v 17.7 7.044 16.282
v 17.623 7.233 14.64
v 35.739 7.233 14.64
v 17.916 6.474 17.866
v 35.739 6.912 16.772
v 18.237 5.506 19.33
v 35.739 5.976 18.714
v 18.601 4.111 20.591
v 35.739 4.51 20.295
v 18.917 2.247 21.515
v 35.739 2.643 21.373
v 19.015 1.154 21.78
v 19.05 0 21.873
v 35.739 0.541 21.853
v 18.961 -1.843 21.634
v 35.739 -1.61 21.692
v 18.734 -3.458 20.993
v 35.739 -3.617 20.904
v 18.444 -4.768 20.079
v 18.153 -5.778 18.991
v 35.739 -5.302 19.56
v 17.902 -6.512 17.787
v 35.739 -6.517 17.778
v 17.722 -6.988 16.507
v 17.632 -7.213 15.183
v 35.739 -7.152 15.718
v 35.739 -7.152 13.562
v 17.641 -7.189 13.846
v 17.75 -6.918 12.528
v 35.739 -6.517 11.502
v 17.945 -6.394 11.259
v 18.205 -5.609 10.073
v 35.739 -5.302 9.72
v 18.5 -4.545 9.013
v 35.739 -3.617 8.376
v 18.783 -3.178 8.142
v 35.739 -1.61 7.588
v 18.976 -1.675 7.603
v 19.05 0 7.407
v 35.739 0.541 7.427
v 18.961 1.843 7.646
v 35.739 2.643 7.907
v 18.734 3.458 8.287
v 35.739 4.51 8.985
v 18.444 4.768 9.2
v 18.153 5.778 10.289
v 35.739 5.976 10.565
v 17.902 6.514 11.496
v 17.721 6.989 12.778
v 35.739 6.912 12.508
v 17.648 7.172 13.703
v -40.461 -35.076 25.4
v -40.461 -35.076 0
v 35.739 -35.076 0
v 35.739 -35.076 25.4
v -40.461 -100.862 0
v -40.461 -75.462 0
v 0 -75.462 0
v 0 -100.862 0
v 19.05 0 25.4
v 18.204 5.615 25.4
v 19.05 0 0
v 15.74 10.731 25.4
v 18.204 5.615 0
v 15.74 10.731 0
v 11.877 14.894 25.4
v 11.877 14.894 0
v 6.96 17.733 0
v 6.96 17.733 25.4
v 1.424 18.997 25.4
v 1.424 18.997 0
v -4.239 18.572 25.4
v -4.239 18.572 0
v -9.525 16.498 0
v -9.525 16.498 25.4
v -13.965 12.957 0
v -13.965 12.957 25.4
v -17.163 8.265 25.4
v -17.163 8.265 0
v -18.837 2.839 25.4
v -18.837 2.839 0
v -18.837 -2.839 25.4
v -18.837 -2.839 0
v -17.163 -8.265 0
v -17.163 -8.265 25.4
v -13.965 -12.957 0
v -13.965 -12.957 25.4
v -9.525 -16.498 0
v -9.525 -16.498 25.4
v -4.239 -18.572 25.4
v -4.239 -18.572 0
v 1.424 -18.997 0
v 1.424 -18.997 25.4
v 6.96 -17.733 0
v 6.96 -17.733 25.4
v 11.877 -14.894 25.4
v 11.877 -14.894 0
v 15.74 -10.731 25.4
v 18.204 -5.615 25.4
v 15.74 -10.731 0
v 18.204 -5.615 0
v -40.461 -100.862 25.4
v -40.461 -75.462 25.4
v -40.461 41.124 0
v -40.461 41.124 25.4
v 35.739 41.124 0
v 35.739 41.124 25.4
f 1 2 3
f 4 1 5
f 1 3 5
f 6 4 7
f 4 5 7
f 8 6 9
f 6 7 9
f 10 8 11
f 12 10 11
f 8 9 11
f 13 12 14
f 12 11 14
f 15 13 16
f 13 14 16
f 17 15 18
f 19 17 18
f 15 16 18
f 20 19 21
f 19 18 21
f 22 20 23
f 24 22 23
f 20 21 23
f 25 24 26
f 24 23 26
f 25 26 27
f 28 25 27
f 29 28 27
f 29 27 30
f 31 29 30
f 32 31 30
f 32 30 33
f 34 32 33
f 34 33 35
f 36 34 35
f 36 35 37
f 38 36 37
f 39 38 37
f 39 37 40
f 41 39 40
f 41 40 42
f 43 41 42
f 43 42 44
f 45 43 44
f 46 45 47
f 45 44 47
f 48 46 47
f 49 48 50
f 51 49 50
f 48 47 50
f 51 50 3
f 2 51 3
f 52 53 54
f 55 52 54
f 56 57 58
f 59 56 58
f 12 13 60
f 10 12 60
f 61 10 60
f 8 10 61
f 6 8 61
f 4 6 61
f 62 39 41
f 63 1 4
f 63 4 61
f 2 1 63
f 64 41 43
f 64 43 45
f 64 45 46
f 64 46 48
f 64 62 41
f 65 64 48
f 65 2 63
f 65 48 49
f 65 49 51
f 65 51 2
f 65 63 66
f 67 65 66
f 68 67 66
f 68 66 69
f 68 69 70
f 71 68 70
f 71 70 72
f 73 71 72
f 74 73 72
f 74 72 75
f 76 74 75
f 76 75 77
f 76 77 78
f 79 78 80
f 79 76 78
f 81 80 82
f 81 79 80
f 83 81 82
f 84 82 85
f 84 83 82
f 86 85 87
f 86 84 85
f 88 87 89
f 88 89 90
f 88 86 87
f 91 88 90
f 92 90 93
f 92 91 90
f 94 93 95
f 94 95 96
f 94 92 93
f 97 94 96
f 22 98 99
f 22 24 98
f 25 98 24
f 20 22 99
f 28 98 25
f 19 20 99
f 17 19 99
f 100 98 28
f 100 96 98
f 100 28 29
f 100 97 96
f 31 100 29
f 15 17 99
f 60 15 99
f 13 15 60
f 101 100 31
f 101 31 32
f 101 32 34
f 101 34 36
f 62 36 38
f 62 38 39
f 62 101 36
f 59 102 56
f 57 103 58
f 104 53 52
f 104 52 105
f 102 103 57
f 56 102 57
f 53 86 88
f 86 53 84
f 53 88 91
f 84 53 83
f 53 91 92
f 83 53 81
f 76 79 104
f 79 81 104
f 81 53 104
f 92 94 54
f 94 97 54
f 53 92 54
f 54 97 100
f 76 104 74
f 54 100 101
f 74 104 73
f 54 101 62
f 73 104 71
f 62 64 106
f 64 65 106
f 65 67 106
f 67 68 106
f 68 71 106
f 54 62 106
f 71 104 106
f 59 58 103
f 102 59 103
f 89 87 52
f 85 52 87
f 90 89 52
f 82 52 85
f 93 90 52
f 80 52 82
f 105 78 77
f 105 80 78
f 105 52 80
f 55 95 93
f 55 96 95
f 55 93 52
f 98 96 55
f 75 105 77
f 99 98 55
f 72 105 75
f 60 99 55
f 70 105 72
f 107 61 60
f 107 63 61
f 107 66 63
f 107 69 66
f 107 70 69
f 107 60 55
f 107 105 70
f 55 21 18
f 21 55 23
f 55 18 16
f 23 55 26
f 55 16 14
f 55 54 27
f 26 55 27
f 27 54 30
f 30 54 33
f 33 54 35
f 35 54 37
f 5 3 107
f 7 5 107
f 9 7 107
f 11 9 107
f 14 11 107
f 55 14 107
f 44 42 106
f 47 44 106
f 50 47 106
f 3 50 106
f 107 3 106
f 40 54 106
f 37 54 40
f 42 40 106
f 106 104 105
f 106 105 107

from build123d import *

# Parameters (mm, degrees)
F0_W     = 76.2
F0_H     = 76.2
F0_R     = 19.05
F1_DEPTH = 25.4
F2_R     = 7.2330774602
F3_DEPTH = 25.4
F7_DEPTH = 25.4


with BuildPart() as f1:
    # F0 (on Top) → F1 (new body)
    with BuildSketch(Plane.XY):
        with Locations((-2.3610922456, 3.023998341)):
            Rectangle(F0_W, F0_H)
        Circle(F0_R, mode=Mode.SUBTRACT)
    extrude(amount=F1_DEPTH)

    # F2 (on face) → F3 (cut)
    with BuildSketch(Plane.YZ.offset(35.7389077544)):
        with Locations((0, 14.6398795769)):
            Circle(F2_R)
    extrude(amount=-F3_DEPTH, mode=Mode.SUBTRACT)


with BuildPart() as f7:
    # F6 (on offset) → F7 (new body)
    with BuildSketch(Plane.XZ.offset(75.462001659)):
        Polygon((-40.4610922456, 0), (0, 0), (-40.4610922456, 25.4), align=None)
    extrude(amount=F7_DEPTH)


solid = Compound([f1.part, f7.part])
